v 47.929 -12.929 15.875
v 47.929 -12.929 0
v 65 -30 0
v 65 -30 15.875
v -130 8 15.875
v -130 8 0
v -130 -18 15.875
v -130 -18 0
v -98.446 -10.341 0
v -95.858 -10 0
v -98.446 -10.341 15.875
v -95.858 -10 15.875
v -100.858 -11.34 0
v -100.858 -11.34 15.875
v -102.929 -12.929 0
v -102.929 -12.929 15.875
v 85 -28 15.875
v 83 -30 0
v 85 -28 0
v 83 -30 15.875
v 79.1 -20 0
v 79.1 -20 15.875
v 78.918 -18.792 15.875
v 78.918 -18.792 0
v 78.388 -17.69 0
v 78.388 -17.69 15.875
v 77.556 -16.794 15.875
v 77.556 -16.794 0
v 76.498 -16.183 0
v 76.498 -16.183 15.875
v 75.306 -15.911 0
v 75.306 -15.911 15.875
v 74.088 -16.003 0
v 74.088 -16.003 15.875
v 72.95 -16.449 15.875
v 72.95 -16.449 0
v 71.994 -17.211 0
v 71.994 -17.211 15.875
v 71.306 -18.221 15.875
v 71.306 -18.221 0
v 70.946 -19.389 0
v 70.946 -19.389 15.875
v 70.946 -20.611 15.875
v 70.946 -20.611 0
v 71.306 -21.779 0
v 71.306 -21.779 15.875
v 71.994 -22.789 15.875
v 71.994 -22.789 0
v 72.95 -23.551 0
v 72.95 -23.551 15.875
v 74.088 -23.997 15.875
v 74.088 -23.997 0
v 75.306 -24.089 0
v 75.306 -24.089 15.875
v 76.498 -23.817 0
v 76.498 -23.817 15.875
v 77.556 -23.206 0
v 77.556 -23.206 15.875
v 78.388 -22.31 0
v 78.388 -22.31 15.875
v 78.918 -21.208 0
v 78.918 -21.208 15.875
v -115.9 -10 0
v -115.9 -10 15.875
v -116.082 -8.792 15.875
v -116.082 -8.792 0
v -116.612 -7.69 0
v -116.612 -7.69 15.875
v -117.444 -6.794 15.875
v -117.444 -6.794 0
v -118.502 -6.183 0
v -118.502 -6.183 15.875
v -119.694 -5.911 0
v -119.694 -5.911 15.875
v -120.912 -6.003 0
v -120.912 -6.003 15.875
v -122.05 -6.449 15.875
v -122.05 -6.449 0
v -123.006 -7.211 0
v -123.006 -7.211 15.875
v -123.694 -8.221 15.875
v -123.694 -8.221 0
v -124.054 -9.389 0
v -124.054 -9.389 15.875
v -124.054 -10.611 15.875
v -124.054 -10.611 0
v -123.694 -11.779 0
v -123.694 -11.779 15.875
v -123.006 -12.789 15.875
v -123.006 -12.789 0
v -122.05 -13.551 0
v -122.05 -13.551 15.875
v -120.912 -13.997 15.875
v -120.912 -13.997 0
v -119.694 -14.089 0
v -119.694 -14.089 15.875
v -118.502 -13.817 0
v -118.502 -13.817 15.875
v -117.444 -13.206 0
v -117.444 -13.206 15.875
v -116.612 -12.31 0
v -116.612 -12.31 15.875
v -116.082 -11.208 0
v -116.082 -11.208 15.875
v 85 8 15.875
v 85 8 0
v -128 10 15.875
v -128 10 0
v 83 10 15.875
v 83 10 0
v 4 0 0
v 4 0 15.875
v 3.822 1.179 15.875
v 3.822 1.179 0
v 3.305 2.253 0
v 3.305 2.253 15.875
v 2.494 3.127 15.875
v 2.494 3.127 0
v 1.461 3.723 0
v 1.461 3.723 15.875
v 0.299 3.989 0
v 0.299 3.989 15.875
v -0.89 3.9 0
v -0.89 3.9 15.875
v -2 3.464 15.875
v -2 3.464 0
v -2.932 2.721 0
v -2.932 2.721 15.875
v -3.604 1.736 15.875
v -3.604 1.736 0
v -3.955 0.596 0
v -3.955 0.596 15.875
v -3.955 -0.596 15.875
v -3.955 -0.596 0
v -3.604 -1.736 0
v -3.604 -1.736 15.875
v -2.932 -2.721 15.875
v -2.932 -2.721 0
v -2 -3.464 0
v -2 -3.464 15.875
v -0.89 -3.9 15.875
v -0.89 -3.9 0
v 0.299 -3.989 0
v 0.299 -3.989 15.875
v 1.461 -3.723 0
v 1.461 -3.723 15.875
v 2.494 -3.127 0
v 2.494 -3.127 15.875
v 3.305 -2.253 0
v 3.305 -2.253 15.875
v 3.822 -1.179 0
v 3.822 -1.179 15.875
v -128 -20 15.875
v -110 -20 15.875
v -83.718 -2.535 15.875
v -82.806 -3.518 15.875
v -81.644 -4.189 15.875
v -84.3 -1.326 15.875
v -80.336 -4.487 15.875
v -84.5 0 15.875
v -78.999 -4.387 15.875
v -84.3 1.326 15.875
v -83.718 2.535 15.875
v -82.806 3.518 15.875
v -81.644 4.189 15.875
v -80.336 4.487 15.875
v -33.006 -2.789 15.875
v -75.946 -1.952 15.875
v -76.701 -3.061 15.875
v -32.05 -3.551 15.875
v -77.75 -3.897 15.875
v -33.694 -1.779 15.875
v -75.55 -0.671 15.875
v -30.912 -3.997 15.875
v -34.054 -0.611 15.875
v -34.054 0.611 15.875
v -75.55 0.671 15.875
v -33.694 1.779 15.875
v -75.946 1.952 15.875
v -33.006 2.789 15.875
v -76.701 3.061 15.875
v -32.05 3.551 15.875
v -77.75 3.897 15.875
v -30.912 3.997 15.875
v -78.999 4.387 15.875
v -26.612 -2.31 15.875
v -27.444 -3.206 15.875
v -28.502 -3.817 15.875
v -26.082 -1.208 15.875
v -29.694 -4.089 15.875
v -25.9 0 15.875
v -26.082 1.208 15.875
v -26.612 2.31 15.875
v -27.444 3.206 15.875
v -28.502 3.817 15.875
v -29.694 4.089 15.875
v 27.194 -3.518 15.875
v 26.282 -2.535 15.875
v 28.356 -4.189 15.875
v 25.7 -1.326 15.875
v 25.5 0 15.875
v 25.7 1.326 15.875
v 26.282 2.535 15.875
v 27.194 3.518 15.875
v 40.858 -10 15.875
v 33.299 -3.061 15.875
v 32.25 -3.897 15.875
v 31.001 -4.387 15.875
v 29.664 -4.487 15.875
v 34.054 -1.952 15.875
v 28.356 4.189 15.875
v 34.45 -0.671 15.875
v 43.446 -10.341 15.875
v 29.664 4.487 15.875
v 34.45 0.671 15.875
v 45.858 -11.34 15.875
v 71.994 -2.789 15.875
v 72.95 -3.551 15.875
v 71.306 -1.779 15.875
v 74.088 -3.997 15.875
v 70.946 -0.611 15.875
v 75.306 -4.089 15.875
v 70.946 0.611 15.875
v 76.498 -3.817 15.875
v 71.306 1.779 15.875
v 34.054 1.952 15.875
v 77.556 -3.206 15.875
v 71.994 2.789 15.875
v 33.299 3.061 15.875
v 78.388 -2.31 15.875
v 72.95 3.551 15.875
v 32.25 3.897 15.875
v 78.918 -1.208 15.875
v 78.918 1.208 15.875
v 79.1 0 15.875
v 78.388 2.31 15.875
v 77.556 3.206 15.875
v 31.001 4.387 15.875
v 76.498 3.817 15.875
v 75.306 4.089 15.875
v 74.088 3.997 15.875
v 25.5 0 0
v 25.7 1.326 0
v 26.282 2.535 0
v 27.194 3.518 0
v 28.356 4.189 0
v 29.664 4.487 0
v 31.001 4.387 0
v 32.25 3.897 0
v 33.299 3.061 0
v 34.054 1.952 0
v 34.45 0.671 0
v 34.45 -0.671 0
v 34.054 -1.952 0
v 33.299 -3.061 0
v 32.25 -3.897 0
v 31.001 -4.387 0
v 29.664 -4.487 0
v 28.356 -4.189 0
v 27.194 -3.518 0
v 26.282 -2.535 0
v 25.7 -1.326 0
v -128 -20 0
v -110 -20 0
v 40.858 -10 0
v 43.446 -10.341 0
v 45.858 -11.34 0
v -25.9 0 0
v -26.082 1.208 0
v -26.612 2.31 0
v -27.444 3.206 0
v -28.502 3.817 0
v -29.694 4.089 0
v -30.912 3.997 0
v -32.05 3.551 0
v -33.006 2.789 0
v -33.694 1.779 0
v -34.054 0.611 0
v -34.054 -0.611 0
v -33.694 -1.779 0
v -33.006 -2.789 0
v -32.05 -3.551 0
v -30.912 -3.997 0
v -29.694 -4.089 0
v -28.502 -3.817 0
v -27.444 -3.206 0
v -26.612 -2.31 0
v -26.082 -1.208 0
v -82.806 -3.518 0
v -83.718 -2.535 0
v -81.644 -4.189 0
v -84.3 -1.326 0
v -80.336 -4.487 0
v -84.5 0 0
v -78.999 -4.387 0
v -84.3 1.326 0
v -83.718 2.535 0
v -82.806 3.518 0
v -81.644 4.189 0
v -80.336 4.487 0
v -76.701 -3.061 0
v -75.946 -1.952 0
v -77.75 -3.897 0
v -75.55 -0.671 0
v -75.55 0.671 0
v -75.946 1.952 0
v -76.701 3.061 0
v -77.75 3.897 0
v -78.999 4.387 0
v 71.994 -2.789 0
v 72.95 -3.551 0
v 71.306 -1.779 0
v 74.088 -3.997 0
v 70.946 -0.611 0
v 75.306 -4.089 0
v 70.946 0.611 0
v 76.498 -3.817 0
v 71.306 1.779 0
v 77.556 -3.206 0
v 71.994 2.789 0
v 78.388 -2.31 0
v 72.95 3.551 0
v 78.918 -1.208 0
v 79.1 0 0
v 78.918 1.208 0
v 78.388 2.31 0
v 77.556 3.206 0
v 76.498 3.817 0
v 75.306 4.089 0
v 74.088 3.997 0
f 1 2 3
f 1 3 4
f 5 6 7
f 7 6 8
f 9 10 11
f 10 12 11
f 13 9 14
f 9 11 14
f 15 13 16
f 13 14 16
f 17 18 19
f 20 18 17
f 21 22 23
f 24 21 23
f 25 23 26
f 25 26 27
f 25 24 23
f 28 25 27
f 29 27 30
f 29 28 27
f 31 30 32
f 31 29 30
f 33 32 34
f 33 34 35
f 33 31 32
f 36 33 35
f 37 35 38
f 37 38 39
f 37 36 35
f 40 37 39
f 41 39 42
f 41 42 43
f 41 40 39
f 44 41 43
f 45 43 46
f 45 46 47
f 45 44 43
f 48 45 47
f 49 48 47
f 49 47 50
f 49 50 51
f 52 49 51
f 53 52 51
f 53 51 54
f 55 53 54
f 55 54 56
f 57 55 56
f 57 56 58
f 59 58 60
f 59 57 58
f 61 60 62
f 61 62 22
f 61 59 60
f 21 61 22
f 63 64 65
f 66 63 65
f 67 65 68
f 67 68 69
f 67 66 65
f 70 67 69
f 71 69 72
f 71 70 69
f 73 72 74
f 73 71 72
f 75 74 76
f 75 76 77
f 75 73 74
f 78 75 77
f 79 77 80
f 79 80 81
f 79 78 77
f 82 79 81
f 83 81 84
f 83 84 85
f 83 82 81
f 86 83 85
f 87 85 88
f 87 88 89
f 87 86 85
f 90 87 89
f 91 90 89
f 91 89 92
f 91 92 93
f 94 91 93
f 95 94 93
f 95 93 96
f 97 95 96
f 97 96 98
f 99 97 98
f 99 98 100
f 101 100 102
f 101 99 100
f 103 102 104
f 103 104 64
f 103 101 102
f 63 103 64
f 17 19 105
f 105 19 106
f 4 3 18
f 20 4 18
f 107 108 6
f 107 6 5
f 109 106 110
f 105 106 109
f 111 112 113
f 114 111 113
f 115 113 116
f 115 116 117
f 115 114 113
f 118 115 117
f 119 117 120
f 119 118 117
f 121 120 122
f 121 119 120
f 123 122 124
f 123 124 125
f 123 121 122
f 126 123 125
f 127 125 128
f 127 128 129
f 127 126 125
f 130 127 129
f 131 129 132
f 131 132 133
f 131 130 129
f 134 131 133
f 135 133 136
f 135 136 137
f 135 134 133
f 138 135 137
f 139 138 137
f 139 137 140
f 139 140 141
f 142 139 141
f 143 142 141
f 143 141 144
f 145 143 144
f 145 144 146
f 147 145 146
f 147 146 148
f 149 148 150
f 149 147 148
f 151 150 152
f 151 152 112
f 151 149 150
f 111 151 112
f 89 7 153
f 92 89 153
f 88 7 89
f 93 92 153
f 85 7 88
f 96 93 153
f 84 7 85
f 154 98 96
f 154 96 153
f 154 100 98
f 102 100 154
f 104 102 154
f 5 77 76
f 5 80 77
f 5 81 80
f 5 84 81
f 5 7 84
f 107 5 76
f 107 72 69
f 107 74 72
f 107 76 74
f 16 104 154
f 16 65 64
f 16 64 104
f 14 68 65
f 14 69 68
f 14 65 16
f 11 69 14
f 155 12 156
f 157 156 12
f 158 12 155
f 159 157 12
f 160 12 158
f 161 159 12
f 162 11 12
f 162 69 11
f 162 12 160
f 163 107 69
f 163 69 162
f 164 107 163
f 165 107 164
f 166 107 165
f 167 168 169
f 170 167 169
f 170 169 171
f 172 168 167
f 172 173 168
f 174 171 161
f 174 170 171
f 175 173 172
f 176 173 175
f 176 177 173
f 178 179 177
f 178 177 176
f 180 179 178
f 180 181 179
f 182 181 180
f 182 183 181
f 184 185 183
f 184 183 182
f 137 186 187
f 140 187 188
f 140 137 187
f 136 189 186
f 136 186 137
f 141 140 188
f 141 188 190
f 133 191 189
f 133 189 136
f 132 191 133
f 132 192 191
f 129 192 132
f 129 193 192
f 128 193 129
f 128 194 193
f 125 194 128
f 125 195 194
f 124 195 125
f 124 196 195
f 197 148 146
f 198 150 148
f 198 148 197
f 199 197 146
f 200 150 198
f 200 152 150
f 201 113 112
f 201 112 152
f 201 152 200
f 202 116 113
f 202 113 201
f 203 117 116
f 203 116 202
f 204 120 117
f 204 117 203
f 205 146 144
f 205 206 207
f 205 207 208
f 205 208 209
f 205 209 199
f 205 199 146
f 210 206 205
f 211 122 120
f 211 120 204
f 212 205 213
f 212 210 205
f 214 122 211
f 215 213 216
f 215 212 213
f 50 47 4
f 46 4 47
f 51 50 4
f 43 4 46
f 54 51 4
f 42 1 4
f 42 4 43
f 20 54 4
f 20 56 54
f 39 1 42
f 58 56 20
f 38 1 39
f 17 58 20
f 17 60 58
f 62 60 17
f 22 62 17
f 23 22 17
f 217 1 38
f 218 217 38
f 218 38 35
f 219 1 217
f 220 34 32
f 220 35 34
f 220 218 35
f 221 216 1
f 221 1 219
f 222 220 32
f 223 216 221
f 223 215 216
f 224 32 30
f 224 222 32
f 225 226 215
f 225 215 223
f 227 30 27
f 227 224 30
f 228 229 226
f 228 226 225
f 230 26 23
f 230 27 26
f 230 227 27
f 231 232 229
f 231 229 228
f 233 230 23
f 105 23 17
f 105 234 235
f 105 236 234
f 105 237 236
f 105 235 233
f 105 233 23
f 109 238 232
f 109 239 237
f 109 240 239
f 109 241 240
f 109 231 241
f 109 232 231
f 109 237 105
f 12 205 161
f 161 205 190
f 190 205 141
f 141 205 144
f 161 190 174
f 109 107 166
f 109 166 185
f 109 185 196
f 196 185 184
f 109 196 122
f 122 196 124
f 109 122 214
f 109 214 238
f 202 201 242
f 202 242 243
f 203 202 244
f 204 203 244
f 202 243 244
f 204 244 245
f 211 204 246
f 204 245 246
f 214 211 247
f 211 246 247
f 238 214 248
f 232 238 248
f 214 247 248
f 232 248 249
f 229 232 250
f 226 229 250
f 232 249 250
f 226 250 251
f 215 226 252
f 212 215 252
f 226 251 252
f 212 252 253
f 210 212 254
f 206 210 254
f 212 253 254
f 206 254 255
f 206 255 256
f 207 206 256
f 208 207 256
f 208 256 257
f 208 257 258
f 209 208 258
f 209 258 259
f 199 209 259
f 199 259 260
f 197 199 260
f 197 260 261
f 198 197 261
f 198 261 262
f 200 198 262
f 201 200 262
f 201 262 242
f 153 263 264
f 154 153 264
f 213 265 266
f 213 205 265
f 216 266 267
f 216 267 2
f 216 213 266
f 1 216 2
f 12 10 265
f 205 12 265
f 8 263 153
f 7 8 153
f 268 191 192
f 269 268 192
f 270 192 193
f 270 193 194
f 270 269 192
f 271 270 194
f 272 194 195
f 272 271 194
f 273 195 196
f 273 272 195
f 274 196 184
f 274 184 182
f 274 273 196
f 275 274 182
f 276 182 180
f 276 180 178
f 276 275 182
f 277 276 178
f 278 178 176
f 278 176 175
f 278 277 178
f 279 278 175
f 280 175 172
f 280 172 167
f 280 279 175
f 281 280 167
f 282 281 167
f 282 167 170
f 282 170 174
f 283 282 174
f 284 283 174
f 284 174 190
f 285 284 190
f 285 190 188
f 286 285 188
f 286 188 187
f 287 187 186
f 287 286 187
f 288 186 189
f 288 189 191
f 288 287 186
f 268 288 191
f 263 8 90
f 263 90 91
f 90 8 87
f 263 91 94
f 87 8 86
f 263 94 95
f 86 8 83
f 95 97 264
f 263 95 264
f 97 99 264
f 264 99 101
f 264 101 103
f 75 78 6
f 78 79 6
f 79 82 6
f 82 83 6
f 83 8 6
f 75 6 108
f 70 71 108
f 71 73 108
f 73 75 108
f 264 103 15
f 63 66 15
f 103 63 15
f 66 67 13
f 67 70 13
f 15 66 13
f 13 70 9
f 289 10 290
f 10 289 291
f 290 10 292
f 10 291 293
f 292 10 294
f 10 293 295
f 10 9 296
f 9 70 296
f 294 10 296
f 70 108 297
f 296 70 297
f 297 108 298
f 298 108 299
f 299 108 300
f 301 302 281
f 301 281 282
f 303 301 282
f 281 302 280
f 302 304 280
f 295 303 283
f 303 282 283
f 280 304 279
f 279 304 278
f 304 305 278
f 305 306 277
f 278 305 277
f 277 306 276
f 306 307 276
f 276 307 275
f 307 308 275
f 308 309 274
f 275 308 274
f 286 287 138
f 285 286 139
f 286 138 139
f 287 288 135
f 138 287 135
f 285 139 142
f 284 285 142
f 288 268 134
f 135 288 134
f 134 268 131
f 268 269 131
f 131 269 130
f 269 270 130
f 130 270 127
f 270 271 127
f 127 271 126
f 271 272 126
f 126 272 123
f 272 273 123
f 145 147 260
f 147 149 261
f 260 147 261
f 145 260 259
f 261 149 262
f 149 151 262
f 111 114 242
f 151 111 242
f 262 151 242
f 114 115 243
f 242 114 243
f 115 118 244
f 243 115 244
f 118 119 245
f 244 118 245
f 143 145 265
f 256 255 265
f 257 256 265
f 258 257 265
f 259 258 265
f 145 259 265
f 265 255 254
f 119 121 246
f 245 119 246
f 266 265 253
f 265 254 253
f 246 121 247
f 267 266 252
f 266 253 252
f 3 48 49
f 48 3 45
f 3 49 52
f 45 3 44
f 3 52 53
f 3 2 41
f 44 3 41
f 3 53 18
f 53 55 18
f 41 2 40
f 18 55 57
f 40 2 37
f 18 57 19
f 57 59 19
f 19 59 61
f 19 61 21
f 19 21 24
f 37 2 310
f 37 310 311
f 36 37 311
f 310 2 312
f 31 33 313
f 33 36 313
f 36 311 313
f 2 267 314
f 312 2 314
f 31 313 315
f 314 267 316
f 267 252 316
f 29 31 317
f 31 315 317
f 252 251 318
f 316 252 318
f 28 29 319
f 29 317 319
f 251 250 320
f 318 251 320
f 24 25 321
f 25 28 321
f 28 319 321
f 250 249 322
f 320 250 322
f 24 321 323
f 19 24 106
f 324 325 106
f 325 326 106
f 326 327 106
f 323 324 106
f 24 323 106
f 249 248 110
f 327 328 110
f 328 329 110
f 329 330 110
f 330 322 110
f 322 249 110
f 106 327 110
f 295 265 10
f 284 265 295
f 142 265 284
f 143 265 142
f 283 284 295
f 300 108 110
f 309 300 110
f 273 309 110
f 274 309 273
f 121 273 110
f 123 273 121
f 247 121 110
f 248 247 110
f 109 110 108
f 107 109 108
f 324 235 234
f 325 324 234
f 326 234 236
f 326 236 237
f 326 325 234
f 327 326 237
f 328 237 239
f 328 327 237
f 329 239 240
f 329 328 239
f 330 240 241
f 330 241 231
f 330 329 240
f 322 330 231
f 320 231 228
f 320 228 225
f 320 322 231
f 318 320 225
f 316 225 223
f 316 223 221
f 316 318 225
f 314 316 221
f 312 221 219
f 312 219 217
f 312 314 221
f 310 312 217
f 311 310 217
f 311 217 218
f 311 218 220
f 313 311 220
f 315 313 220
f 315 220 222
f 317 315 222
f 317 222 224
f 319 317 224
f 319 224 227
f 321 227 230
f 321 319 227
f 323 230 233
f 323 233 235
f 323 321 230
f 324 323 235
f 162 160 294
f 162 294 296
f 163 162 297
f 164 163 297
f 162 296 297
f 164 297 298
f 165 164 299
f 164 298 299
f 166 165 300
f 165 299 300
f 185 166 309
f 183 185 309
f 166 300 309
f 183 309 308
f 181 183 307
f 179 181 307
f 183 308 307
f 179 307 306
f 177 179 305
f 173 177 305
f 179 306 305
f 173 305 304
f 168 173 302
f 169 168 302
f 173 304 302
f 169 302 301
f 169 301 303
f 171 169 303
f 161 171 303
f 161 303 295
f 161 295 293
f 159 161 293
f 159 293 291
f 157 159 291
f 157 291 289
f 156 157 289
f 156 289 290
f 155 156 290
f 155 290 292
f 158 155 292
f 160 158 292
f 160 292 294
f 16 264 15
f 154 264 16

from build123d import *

# Parameters (mm, degrees)
SKETCH_1_R          = 4
SKETCH_1_R_2        = 4.1
EXTRUDE_1_DEPTH     = 15.875
CHAMFER_1_SIZE      = 2
SKETCH_2_R          = 4.5
CUT_EXTRUDE_1_DEPTH = 20
SKETCH_3_R          = 4.5
CUT_EXTRUDE_2_DEPTH = 20
CHAMFER_2_SIZE      = 20
CHAMFER_3_SIZE      = 10
FILLET_1_R          = 10


with BuildPart() as part:
    # 草图1 → 凸台-拉伸1 (new body)
    with BuildSketch(Plane.XY):
        Polygon((0, 10), (-130, 10), (-130, -20), (-110, -20), (-110, -10), (0, -10), (65, -10), (65, -30), (85, -30), (85, 10), align=None)
        Circle(SKETCH_1_R, mode=Mode.SUBTRACT)
        with Locations((-30, 0)):
            Circle(SKETCH_1_R_2, mode=Mode.SUBTRACT)
        with Locations((75, 0)):
            Circle(SKETCH_1_R_2, mode=Mode.SUBTRACT)
        with Locations((75, -20)):
            Circle(SKETCH_1_R_2, mode=Mode.SUBTRACT)
        with Locations((-120, -10)):
            Circle(SKETCH_1_R_2, mode=Mode.SUBTRACT)
    extrude(amount=EXTRUDE_1_DEPTH)

    # 倒角1
    chamfer_1_edges = [part.edges().sort_by_distance(p)[0] for p in [
        (-130, 10, 7.9375),
        (85, 10, 7.9375),
        (85, -30, 7.9375),
        (-130, -20, 7.9375),
    ]]
    chamfer(chamfer_1_edges, length=CHAMFER_1_SIZE)

    # 草图2 → 切除-拉伸1 (cut)
    with BuildSketch(Plane(origin=(0, 0, 0), x_dir=(-1, 0, 0), z_dir=(0, 0, -1))):
        with Locations((-30, 0)):
            Circle(SKETCH_2_R)
    extrude(amount=-CUT_EXTRUDE_1_DEPTH, mode=Mode.SUBTRACT)

    # 草图3 → 切除-拉伸2 (cut)
    with BuildSketch(Plane(origin=(0, 0, 0), x_dir=(-1, 0, 0), z_dir=(0, 0, -1))):
        with Locations((80, 0)):
            Circle(SKETCH_3_R)
    extrude(amount=-CUT_EXTRUDE_2_DEPTH, mode=Mode.SUBTRACT)

    # 倒角2
    chamfer_2_edges = [part.edges().sort_by_distance(p)[0] for p in [
        (65, -10, 7.9375),
    ]]
    chamfer(chamfer_2_edges, length=CHAMFER_2_SIZE - 0.0001)  # a hair under: the kernel refuses the full size

    # 倒角3
    chamfer_3_edges = [part.edges().sort_by_distance(p)[0] for p in [
        (-110, -10, 7.9375),
    ]]
    chamfer(chamfer_3_edges, length=CHAMFER_3_SIZE - 0.0001)  # a hair under: the kernel refuses the full size

    # 圆角1
    fillet_1_edges = [part.edges().sort_by_distance(p)[0] for p in [
        (45.0001, -10, 7.9375),
        (-100.0001, -10, 7.9375),
    ]]
    fillet(fillet_1_edges, radius=FILLET_1_R)


solid = part.part
